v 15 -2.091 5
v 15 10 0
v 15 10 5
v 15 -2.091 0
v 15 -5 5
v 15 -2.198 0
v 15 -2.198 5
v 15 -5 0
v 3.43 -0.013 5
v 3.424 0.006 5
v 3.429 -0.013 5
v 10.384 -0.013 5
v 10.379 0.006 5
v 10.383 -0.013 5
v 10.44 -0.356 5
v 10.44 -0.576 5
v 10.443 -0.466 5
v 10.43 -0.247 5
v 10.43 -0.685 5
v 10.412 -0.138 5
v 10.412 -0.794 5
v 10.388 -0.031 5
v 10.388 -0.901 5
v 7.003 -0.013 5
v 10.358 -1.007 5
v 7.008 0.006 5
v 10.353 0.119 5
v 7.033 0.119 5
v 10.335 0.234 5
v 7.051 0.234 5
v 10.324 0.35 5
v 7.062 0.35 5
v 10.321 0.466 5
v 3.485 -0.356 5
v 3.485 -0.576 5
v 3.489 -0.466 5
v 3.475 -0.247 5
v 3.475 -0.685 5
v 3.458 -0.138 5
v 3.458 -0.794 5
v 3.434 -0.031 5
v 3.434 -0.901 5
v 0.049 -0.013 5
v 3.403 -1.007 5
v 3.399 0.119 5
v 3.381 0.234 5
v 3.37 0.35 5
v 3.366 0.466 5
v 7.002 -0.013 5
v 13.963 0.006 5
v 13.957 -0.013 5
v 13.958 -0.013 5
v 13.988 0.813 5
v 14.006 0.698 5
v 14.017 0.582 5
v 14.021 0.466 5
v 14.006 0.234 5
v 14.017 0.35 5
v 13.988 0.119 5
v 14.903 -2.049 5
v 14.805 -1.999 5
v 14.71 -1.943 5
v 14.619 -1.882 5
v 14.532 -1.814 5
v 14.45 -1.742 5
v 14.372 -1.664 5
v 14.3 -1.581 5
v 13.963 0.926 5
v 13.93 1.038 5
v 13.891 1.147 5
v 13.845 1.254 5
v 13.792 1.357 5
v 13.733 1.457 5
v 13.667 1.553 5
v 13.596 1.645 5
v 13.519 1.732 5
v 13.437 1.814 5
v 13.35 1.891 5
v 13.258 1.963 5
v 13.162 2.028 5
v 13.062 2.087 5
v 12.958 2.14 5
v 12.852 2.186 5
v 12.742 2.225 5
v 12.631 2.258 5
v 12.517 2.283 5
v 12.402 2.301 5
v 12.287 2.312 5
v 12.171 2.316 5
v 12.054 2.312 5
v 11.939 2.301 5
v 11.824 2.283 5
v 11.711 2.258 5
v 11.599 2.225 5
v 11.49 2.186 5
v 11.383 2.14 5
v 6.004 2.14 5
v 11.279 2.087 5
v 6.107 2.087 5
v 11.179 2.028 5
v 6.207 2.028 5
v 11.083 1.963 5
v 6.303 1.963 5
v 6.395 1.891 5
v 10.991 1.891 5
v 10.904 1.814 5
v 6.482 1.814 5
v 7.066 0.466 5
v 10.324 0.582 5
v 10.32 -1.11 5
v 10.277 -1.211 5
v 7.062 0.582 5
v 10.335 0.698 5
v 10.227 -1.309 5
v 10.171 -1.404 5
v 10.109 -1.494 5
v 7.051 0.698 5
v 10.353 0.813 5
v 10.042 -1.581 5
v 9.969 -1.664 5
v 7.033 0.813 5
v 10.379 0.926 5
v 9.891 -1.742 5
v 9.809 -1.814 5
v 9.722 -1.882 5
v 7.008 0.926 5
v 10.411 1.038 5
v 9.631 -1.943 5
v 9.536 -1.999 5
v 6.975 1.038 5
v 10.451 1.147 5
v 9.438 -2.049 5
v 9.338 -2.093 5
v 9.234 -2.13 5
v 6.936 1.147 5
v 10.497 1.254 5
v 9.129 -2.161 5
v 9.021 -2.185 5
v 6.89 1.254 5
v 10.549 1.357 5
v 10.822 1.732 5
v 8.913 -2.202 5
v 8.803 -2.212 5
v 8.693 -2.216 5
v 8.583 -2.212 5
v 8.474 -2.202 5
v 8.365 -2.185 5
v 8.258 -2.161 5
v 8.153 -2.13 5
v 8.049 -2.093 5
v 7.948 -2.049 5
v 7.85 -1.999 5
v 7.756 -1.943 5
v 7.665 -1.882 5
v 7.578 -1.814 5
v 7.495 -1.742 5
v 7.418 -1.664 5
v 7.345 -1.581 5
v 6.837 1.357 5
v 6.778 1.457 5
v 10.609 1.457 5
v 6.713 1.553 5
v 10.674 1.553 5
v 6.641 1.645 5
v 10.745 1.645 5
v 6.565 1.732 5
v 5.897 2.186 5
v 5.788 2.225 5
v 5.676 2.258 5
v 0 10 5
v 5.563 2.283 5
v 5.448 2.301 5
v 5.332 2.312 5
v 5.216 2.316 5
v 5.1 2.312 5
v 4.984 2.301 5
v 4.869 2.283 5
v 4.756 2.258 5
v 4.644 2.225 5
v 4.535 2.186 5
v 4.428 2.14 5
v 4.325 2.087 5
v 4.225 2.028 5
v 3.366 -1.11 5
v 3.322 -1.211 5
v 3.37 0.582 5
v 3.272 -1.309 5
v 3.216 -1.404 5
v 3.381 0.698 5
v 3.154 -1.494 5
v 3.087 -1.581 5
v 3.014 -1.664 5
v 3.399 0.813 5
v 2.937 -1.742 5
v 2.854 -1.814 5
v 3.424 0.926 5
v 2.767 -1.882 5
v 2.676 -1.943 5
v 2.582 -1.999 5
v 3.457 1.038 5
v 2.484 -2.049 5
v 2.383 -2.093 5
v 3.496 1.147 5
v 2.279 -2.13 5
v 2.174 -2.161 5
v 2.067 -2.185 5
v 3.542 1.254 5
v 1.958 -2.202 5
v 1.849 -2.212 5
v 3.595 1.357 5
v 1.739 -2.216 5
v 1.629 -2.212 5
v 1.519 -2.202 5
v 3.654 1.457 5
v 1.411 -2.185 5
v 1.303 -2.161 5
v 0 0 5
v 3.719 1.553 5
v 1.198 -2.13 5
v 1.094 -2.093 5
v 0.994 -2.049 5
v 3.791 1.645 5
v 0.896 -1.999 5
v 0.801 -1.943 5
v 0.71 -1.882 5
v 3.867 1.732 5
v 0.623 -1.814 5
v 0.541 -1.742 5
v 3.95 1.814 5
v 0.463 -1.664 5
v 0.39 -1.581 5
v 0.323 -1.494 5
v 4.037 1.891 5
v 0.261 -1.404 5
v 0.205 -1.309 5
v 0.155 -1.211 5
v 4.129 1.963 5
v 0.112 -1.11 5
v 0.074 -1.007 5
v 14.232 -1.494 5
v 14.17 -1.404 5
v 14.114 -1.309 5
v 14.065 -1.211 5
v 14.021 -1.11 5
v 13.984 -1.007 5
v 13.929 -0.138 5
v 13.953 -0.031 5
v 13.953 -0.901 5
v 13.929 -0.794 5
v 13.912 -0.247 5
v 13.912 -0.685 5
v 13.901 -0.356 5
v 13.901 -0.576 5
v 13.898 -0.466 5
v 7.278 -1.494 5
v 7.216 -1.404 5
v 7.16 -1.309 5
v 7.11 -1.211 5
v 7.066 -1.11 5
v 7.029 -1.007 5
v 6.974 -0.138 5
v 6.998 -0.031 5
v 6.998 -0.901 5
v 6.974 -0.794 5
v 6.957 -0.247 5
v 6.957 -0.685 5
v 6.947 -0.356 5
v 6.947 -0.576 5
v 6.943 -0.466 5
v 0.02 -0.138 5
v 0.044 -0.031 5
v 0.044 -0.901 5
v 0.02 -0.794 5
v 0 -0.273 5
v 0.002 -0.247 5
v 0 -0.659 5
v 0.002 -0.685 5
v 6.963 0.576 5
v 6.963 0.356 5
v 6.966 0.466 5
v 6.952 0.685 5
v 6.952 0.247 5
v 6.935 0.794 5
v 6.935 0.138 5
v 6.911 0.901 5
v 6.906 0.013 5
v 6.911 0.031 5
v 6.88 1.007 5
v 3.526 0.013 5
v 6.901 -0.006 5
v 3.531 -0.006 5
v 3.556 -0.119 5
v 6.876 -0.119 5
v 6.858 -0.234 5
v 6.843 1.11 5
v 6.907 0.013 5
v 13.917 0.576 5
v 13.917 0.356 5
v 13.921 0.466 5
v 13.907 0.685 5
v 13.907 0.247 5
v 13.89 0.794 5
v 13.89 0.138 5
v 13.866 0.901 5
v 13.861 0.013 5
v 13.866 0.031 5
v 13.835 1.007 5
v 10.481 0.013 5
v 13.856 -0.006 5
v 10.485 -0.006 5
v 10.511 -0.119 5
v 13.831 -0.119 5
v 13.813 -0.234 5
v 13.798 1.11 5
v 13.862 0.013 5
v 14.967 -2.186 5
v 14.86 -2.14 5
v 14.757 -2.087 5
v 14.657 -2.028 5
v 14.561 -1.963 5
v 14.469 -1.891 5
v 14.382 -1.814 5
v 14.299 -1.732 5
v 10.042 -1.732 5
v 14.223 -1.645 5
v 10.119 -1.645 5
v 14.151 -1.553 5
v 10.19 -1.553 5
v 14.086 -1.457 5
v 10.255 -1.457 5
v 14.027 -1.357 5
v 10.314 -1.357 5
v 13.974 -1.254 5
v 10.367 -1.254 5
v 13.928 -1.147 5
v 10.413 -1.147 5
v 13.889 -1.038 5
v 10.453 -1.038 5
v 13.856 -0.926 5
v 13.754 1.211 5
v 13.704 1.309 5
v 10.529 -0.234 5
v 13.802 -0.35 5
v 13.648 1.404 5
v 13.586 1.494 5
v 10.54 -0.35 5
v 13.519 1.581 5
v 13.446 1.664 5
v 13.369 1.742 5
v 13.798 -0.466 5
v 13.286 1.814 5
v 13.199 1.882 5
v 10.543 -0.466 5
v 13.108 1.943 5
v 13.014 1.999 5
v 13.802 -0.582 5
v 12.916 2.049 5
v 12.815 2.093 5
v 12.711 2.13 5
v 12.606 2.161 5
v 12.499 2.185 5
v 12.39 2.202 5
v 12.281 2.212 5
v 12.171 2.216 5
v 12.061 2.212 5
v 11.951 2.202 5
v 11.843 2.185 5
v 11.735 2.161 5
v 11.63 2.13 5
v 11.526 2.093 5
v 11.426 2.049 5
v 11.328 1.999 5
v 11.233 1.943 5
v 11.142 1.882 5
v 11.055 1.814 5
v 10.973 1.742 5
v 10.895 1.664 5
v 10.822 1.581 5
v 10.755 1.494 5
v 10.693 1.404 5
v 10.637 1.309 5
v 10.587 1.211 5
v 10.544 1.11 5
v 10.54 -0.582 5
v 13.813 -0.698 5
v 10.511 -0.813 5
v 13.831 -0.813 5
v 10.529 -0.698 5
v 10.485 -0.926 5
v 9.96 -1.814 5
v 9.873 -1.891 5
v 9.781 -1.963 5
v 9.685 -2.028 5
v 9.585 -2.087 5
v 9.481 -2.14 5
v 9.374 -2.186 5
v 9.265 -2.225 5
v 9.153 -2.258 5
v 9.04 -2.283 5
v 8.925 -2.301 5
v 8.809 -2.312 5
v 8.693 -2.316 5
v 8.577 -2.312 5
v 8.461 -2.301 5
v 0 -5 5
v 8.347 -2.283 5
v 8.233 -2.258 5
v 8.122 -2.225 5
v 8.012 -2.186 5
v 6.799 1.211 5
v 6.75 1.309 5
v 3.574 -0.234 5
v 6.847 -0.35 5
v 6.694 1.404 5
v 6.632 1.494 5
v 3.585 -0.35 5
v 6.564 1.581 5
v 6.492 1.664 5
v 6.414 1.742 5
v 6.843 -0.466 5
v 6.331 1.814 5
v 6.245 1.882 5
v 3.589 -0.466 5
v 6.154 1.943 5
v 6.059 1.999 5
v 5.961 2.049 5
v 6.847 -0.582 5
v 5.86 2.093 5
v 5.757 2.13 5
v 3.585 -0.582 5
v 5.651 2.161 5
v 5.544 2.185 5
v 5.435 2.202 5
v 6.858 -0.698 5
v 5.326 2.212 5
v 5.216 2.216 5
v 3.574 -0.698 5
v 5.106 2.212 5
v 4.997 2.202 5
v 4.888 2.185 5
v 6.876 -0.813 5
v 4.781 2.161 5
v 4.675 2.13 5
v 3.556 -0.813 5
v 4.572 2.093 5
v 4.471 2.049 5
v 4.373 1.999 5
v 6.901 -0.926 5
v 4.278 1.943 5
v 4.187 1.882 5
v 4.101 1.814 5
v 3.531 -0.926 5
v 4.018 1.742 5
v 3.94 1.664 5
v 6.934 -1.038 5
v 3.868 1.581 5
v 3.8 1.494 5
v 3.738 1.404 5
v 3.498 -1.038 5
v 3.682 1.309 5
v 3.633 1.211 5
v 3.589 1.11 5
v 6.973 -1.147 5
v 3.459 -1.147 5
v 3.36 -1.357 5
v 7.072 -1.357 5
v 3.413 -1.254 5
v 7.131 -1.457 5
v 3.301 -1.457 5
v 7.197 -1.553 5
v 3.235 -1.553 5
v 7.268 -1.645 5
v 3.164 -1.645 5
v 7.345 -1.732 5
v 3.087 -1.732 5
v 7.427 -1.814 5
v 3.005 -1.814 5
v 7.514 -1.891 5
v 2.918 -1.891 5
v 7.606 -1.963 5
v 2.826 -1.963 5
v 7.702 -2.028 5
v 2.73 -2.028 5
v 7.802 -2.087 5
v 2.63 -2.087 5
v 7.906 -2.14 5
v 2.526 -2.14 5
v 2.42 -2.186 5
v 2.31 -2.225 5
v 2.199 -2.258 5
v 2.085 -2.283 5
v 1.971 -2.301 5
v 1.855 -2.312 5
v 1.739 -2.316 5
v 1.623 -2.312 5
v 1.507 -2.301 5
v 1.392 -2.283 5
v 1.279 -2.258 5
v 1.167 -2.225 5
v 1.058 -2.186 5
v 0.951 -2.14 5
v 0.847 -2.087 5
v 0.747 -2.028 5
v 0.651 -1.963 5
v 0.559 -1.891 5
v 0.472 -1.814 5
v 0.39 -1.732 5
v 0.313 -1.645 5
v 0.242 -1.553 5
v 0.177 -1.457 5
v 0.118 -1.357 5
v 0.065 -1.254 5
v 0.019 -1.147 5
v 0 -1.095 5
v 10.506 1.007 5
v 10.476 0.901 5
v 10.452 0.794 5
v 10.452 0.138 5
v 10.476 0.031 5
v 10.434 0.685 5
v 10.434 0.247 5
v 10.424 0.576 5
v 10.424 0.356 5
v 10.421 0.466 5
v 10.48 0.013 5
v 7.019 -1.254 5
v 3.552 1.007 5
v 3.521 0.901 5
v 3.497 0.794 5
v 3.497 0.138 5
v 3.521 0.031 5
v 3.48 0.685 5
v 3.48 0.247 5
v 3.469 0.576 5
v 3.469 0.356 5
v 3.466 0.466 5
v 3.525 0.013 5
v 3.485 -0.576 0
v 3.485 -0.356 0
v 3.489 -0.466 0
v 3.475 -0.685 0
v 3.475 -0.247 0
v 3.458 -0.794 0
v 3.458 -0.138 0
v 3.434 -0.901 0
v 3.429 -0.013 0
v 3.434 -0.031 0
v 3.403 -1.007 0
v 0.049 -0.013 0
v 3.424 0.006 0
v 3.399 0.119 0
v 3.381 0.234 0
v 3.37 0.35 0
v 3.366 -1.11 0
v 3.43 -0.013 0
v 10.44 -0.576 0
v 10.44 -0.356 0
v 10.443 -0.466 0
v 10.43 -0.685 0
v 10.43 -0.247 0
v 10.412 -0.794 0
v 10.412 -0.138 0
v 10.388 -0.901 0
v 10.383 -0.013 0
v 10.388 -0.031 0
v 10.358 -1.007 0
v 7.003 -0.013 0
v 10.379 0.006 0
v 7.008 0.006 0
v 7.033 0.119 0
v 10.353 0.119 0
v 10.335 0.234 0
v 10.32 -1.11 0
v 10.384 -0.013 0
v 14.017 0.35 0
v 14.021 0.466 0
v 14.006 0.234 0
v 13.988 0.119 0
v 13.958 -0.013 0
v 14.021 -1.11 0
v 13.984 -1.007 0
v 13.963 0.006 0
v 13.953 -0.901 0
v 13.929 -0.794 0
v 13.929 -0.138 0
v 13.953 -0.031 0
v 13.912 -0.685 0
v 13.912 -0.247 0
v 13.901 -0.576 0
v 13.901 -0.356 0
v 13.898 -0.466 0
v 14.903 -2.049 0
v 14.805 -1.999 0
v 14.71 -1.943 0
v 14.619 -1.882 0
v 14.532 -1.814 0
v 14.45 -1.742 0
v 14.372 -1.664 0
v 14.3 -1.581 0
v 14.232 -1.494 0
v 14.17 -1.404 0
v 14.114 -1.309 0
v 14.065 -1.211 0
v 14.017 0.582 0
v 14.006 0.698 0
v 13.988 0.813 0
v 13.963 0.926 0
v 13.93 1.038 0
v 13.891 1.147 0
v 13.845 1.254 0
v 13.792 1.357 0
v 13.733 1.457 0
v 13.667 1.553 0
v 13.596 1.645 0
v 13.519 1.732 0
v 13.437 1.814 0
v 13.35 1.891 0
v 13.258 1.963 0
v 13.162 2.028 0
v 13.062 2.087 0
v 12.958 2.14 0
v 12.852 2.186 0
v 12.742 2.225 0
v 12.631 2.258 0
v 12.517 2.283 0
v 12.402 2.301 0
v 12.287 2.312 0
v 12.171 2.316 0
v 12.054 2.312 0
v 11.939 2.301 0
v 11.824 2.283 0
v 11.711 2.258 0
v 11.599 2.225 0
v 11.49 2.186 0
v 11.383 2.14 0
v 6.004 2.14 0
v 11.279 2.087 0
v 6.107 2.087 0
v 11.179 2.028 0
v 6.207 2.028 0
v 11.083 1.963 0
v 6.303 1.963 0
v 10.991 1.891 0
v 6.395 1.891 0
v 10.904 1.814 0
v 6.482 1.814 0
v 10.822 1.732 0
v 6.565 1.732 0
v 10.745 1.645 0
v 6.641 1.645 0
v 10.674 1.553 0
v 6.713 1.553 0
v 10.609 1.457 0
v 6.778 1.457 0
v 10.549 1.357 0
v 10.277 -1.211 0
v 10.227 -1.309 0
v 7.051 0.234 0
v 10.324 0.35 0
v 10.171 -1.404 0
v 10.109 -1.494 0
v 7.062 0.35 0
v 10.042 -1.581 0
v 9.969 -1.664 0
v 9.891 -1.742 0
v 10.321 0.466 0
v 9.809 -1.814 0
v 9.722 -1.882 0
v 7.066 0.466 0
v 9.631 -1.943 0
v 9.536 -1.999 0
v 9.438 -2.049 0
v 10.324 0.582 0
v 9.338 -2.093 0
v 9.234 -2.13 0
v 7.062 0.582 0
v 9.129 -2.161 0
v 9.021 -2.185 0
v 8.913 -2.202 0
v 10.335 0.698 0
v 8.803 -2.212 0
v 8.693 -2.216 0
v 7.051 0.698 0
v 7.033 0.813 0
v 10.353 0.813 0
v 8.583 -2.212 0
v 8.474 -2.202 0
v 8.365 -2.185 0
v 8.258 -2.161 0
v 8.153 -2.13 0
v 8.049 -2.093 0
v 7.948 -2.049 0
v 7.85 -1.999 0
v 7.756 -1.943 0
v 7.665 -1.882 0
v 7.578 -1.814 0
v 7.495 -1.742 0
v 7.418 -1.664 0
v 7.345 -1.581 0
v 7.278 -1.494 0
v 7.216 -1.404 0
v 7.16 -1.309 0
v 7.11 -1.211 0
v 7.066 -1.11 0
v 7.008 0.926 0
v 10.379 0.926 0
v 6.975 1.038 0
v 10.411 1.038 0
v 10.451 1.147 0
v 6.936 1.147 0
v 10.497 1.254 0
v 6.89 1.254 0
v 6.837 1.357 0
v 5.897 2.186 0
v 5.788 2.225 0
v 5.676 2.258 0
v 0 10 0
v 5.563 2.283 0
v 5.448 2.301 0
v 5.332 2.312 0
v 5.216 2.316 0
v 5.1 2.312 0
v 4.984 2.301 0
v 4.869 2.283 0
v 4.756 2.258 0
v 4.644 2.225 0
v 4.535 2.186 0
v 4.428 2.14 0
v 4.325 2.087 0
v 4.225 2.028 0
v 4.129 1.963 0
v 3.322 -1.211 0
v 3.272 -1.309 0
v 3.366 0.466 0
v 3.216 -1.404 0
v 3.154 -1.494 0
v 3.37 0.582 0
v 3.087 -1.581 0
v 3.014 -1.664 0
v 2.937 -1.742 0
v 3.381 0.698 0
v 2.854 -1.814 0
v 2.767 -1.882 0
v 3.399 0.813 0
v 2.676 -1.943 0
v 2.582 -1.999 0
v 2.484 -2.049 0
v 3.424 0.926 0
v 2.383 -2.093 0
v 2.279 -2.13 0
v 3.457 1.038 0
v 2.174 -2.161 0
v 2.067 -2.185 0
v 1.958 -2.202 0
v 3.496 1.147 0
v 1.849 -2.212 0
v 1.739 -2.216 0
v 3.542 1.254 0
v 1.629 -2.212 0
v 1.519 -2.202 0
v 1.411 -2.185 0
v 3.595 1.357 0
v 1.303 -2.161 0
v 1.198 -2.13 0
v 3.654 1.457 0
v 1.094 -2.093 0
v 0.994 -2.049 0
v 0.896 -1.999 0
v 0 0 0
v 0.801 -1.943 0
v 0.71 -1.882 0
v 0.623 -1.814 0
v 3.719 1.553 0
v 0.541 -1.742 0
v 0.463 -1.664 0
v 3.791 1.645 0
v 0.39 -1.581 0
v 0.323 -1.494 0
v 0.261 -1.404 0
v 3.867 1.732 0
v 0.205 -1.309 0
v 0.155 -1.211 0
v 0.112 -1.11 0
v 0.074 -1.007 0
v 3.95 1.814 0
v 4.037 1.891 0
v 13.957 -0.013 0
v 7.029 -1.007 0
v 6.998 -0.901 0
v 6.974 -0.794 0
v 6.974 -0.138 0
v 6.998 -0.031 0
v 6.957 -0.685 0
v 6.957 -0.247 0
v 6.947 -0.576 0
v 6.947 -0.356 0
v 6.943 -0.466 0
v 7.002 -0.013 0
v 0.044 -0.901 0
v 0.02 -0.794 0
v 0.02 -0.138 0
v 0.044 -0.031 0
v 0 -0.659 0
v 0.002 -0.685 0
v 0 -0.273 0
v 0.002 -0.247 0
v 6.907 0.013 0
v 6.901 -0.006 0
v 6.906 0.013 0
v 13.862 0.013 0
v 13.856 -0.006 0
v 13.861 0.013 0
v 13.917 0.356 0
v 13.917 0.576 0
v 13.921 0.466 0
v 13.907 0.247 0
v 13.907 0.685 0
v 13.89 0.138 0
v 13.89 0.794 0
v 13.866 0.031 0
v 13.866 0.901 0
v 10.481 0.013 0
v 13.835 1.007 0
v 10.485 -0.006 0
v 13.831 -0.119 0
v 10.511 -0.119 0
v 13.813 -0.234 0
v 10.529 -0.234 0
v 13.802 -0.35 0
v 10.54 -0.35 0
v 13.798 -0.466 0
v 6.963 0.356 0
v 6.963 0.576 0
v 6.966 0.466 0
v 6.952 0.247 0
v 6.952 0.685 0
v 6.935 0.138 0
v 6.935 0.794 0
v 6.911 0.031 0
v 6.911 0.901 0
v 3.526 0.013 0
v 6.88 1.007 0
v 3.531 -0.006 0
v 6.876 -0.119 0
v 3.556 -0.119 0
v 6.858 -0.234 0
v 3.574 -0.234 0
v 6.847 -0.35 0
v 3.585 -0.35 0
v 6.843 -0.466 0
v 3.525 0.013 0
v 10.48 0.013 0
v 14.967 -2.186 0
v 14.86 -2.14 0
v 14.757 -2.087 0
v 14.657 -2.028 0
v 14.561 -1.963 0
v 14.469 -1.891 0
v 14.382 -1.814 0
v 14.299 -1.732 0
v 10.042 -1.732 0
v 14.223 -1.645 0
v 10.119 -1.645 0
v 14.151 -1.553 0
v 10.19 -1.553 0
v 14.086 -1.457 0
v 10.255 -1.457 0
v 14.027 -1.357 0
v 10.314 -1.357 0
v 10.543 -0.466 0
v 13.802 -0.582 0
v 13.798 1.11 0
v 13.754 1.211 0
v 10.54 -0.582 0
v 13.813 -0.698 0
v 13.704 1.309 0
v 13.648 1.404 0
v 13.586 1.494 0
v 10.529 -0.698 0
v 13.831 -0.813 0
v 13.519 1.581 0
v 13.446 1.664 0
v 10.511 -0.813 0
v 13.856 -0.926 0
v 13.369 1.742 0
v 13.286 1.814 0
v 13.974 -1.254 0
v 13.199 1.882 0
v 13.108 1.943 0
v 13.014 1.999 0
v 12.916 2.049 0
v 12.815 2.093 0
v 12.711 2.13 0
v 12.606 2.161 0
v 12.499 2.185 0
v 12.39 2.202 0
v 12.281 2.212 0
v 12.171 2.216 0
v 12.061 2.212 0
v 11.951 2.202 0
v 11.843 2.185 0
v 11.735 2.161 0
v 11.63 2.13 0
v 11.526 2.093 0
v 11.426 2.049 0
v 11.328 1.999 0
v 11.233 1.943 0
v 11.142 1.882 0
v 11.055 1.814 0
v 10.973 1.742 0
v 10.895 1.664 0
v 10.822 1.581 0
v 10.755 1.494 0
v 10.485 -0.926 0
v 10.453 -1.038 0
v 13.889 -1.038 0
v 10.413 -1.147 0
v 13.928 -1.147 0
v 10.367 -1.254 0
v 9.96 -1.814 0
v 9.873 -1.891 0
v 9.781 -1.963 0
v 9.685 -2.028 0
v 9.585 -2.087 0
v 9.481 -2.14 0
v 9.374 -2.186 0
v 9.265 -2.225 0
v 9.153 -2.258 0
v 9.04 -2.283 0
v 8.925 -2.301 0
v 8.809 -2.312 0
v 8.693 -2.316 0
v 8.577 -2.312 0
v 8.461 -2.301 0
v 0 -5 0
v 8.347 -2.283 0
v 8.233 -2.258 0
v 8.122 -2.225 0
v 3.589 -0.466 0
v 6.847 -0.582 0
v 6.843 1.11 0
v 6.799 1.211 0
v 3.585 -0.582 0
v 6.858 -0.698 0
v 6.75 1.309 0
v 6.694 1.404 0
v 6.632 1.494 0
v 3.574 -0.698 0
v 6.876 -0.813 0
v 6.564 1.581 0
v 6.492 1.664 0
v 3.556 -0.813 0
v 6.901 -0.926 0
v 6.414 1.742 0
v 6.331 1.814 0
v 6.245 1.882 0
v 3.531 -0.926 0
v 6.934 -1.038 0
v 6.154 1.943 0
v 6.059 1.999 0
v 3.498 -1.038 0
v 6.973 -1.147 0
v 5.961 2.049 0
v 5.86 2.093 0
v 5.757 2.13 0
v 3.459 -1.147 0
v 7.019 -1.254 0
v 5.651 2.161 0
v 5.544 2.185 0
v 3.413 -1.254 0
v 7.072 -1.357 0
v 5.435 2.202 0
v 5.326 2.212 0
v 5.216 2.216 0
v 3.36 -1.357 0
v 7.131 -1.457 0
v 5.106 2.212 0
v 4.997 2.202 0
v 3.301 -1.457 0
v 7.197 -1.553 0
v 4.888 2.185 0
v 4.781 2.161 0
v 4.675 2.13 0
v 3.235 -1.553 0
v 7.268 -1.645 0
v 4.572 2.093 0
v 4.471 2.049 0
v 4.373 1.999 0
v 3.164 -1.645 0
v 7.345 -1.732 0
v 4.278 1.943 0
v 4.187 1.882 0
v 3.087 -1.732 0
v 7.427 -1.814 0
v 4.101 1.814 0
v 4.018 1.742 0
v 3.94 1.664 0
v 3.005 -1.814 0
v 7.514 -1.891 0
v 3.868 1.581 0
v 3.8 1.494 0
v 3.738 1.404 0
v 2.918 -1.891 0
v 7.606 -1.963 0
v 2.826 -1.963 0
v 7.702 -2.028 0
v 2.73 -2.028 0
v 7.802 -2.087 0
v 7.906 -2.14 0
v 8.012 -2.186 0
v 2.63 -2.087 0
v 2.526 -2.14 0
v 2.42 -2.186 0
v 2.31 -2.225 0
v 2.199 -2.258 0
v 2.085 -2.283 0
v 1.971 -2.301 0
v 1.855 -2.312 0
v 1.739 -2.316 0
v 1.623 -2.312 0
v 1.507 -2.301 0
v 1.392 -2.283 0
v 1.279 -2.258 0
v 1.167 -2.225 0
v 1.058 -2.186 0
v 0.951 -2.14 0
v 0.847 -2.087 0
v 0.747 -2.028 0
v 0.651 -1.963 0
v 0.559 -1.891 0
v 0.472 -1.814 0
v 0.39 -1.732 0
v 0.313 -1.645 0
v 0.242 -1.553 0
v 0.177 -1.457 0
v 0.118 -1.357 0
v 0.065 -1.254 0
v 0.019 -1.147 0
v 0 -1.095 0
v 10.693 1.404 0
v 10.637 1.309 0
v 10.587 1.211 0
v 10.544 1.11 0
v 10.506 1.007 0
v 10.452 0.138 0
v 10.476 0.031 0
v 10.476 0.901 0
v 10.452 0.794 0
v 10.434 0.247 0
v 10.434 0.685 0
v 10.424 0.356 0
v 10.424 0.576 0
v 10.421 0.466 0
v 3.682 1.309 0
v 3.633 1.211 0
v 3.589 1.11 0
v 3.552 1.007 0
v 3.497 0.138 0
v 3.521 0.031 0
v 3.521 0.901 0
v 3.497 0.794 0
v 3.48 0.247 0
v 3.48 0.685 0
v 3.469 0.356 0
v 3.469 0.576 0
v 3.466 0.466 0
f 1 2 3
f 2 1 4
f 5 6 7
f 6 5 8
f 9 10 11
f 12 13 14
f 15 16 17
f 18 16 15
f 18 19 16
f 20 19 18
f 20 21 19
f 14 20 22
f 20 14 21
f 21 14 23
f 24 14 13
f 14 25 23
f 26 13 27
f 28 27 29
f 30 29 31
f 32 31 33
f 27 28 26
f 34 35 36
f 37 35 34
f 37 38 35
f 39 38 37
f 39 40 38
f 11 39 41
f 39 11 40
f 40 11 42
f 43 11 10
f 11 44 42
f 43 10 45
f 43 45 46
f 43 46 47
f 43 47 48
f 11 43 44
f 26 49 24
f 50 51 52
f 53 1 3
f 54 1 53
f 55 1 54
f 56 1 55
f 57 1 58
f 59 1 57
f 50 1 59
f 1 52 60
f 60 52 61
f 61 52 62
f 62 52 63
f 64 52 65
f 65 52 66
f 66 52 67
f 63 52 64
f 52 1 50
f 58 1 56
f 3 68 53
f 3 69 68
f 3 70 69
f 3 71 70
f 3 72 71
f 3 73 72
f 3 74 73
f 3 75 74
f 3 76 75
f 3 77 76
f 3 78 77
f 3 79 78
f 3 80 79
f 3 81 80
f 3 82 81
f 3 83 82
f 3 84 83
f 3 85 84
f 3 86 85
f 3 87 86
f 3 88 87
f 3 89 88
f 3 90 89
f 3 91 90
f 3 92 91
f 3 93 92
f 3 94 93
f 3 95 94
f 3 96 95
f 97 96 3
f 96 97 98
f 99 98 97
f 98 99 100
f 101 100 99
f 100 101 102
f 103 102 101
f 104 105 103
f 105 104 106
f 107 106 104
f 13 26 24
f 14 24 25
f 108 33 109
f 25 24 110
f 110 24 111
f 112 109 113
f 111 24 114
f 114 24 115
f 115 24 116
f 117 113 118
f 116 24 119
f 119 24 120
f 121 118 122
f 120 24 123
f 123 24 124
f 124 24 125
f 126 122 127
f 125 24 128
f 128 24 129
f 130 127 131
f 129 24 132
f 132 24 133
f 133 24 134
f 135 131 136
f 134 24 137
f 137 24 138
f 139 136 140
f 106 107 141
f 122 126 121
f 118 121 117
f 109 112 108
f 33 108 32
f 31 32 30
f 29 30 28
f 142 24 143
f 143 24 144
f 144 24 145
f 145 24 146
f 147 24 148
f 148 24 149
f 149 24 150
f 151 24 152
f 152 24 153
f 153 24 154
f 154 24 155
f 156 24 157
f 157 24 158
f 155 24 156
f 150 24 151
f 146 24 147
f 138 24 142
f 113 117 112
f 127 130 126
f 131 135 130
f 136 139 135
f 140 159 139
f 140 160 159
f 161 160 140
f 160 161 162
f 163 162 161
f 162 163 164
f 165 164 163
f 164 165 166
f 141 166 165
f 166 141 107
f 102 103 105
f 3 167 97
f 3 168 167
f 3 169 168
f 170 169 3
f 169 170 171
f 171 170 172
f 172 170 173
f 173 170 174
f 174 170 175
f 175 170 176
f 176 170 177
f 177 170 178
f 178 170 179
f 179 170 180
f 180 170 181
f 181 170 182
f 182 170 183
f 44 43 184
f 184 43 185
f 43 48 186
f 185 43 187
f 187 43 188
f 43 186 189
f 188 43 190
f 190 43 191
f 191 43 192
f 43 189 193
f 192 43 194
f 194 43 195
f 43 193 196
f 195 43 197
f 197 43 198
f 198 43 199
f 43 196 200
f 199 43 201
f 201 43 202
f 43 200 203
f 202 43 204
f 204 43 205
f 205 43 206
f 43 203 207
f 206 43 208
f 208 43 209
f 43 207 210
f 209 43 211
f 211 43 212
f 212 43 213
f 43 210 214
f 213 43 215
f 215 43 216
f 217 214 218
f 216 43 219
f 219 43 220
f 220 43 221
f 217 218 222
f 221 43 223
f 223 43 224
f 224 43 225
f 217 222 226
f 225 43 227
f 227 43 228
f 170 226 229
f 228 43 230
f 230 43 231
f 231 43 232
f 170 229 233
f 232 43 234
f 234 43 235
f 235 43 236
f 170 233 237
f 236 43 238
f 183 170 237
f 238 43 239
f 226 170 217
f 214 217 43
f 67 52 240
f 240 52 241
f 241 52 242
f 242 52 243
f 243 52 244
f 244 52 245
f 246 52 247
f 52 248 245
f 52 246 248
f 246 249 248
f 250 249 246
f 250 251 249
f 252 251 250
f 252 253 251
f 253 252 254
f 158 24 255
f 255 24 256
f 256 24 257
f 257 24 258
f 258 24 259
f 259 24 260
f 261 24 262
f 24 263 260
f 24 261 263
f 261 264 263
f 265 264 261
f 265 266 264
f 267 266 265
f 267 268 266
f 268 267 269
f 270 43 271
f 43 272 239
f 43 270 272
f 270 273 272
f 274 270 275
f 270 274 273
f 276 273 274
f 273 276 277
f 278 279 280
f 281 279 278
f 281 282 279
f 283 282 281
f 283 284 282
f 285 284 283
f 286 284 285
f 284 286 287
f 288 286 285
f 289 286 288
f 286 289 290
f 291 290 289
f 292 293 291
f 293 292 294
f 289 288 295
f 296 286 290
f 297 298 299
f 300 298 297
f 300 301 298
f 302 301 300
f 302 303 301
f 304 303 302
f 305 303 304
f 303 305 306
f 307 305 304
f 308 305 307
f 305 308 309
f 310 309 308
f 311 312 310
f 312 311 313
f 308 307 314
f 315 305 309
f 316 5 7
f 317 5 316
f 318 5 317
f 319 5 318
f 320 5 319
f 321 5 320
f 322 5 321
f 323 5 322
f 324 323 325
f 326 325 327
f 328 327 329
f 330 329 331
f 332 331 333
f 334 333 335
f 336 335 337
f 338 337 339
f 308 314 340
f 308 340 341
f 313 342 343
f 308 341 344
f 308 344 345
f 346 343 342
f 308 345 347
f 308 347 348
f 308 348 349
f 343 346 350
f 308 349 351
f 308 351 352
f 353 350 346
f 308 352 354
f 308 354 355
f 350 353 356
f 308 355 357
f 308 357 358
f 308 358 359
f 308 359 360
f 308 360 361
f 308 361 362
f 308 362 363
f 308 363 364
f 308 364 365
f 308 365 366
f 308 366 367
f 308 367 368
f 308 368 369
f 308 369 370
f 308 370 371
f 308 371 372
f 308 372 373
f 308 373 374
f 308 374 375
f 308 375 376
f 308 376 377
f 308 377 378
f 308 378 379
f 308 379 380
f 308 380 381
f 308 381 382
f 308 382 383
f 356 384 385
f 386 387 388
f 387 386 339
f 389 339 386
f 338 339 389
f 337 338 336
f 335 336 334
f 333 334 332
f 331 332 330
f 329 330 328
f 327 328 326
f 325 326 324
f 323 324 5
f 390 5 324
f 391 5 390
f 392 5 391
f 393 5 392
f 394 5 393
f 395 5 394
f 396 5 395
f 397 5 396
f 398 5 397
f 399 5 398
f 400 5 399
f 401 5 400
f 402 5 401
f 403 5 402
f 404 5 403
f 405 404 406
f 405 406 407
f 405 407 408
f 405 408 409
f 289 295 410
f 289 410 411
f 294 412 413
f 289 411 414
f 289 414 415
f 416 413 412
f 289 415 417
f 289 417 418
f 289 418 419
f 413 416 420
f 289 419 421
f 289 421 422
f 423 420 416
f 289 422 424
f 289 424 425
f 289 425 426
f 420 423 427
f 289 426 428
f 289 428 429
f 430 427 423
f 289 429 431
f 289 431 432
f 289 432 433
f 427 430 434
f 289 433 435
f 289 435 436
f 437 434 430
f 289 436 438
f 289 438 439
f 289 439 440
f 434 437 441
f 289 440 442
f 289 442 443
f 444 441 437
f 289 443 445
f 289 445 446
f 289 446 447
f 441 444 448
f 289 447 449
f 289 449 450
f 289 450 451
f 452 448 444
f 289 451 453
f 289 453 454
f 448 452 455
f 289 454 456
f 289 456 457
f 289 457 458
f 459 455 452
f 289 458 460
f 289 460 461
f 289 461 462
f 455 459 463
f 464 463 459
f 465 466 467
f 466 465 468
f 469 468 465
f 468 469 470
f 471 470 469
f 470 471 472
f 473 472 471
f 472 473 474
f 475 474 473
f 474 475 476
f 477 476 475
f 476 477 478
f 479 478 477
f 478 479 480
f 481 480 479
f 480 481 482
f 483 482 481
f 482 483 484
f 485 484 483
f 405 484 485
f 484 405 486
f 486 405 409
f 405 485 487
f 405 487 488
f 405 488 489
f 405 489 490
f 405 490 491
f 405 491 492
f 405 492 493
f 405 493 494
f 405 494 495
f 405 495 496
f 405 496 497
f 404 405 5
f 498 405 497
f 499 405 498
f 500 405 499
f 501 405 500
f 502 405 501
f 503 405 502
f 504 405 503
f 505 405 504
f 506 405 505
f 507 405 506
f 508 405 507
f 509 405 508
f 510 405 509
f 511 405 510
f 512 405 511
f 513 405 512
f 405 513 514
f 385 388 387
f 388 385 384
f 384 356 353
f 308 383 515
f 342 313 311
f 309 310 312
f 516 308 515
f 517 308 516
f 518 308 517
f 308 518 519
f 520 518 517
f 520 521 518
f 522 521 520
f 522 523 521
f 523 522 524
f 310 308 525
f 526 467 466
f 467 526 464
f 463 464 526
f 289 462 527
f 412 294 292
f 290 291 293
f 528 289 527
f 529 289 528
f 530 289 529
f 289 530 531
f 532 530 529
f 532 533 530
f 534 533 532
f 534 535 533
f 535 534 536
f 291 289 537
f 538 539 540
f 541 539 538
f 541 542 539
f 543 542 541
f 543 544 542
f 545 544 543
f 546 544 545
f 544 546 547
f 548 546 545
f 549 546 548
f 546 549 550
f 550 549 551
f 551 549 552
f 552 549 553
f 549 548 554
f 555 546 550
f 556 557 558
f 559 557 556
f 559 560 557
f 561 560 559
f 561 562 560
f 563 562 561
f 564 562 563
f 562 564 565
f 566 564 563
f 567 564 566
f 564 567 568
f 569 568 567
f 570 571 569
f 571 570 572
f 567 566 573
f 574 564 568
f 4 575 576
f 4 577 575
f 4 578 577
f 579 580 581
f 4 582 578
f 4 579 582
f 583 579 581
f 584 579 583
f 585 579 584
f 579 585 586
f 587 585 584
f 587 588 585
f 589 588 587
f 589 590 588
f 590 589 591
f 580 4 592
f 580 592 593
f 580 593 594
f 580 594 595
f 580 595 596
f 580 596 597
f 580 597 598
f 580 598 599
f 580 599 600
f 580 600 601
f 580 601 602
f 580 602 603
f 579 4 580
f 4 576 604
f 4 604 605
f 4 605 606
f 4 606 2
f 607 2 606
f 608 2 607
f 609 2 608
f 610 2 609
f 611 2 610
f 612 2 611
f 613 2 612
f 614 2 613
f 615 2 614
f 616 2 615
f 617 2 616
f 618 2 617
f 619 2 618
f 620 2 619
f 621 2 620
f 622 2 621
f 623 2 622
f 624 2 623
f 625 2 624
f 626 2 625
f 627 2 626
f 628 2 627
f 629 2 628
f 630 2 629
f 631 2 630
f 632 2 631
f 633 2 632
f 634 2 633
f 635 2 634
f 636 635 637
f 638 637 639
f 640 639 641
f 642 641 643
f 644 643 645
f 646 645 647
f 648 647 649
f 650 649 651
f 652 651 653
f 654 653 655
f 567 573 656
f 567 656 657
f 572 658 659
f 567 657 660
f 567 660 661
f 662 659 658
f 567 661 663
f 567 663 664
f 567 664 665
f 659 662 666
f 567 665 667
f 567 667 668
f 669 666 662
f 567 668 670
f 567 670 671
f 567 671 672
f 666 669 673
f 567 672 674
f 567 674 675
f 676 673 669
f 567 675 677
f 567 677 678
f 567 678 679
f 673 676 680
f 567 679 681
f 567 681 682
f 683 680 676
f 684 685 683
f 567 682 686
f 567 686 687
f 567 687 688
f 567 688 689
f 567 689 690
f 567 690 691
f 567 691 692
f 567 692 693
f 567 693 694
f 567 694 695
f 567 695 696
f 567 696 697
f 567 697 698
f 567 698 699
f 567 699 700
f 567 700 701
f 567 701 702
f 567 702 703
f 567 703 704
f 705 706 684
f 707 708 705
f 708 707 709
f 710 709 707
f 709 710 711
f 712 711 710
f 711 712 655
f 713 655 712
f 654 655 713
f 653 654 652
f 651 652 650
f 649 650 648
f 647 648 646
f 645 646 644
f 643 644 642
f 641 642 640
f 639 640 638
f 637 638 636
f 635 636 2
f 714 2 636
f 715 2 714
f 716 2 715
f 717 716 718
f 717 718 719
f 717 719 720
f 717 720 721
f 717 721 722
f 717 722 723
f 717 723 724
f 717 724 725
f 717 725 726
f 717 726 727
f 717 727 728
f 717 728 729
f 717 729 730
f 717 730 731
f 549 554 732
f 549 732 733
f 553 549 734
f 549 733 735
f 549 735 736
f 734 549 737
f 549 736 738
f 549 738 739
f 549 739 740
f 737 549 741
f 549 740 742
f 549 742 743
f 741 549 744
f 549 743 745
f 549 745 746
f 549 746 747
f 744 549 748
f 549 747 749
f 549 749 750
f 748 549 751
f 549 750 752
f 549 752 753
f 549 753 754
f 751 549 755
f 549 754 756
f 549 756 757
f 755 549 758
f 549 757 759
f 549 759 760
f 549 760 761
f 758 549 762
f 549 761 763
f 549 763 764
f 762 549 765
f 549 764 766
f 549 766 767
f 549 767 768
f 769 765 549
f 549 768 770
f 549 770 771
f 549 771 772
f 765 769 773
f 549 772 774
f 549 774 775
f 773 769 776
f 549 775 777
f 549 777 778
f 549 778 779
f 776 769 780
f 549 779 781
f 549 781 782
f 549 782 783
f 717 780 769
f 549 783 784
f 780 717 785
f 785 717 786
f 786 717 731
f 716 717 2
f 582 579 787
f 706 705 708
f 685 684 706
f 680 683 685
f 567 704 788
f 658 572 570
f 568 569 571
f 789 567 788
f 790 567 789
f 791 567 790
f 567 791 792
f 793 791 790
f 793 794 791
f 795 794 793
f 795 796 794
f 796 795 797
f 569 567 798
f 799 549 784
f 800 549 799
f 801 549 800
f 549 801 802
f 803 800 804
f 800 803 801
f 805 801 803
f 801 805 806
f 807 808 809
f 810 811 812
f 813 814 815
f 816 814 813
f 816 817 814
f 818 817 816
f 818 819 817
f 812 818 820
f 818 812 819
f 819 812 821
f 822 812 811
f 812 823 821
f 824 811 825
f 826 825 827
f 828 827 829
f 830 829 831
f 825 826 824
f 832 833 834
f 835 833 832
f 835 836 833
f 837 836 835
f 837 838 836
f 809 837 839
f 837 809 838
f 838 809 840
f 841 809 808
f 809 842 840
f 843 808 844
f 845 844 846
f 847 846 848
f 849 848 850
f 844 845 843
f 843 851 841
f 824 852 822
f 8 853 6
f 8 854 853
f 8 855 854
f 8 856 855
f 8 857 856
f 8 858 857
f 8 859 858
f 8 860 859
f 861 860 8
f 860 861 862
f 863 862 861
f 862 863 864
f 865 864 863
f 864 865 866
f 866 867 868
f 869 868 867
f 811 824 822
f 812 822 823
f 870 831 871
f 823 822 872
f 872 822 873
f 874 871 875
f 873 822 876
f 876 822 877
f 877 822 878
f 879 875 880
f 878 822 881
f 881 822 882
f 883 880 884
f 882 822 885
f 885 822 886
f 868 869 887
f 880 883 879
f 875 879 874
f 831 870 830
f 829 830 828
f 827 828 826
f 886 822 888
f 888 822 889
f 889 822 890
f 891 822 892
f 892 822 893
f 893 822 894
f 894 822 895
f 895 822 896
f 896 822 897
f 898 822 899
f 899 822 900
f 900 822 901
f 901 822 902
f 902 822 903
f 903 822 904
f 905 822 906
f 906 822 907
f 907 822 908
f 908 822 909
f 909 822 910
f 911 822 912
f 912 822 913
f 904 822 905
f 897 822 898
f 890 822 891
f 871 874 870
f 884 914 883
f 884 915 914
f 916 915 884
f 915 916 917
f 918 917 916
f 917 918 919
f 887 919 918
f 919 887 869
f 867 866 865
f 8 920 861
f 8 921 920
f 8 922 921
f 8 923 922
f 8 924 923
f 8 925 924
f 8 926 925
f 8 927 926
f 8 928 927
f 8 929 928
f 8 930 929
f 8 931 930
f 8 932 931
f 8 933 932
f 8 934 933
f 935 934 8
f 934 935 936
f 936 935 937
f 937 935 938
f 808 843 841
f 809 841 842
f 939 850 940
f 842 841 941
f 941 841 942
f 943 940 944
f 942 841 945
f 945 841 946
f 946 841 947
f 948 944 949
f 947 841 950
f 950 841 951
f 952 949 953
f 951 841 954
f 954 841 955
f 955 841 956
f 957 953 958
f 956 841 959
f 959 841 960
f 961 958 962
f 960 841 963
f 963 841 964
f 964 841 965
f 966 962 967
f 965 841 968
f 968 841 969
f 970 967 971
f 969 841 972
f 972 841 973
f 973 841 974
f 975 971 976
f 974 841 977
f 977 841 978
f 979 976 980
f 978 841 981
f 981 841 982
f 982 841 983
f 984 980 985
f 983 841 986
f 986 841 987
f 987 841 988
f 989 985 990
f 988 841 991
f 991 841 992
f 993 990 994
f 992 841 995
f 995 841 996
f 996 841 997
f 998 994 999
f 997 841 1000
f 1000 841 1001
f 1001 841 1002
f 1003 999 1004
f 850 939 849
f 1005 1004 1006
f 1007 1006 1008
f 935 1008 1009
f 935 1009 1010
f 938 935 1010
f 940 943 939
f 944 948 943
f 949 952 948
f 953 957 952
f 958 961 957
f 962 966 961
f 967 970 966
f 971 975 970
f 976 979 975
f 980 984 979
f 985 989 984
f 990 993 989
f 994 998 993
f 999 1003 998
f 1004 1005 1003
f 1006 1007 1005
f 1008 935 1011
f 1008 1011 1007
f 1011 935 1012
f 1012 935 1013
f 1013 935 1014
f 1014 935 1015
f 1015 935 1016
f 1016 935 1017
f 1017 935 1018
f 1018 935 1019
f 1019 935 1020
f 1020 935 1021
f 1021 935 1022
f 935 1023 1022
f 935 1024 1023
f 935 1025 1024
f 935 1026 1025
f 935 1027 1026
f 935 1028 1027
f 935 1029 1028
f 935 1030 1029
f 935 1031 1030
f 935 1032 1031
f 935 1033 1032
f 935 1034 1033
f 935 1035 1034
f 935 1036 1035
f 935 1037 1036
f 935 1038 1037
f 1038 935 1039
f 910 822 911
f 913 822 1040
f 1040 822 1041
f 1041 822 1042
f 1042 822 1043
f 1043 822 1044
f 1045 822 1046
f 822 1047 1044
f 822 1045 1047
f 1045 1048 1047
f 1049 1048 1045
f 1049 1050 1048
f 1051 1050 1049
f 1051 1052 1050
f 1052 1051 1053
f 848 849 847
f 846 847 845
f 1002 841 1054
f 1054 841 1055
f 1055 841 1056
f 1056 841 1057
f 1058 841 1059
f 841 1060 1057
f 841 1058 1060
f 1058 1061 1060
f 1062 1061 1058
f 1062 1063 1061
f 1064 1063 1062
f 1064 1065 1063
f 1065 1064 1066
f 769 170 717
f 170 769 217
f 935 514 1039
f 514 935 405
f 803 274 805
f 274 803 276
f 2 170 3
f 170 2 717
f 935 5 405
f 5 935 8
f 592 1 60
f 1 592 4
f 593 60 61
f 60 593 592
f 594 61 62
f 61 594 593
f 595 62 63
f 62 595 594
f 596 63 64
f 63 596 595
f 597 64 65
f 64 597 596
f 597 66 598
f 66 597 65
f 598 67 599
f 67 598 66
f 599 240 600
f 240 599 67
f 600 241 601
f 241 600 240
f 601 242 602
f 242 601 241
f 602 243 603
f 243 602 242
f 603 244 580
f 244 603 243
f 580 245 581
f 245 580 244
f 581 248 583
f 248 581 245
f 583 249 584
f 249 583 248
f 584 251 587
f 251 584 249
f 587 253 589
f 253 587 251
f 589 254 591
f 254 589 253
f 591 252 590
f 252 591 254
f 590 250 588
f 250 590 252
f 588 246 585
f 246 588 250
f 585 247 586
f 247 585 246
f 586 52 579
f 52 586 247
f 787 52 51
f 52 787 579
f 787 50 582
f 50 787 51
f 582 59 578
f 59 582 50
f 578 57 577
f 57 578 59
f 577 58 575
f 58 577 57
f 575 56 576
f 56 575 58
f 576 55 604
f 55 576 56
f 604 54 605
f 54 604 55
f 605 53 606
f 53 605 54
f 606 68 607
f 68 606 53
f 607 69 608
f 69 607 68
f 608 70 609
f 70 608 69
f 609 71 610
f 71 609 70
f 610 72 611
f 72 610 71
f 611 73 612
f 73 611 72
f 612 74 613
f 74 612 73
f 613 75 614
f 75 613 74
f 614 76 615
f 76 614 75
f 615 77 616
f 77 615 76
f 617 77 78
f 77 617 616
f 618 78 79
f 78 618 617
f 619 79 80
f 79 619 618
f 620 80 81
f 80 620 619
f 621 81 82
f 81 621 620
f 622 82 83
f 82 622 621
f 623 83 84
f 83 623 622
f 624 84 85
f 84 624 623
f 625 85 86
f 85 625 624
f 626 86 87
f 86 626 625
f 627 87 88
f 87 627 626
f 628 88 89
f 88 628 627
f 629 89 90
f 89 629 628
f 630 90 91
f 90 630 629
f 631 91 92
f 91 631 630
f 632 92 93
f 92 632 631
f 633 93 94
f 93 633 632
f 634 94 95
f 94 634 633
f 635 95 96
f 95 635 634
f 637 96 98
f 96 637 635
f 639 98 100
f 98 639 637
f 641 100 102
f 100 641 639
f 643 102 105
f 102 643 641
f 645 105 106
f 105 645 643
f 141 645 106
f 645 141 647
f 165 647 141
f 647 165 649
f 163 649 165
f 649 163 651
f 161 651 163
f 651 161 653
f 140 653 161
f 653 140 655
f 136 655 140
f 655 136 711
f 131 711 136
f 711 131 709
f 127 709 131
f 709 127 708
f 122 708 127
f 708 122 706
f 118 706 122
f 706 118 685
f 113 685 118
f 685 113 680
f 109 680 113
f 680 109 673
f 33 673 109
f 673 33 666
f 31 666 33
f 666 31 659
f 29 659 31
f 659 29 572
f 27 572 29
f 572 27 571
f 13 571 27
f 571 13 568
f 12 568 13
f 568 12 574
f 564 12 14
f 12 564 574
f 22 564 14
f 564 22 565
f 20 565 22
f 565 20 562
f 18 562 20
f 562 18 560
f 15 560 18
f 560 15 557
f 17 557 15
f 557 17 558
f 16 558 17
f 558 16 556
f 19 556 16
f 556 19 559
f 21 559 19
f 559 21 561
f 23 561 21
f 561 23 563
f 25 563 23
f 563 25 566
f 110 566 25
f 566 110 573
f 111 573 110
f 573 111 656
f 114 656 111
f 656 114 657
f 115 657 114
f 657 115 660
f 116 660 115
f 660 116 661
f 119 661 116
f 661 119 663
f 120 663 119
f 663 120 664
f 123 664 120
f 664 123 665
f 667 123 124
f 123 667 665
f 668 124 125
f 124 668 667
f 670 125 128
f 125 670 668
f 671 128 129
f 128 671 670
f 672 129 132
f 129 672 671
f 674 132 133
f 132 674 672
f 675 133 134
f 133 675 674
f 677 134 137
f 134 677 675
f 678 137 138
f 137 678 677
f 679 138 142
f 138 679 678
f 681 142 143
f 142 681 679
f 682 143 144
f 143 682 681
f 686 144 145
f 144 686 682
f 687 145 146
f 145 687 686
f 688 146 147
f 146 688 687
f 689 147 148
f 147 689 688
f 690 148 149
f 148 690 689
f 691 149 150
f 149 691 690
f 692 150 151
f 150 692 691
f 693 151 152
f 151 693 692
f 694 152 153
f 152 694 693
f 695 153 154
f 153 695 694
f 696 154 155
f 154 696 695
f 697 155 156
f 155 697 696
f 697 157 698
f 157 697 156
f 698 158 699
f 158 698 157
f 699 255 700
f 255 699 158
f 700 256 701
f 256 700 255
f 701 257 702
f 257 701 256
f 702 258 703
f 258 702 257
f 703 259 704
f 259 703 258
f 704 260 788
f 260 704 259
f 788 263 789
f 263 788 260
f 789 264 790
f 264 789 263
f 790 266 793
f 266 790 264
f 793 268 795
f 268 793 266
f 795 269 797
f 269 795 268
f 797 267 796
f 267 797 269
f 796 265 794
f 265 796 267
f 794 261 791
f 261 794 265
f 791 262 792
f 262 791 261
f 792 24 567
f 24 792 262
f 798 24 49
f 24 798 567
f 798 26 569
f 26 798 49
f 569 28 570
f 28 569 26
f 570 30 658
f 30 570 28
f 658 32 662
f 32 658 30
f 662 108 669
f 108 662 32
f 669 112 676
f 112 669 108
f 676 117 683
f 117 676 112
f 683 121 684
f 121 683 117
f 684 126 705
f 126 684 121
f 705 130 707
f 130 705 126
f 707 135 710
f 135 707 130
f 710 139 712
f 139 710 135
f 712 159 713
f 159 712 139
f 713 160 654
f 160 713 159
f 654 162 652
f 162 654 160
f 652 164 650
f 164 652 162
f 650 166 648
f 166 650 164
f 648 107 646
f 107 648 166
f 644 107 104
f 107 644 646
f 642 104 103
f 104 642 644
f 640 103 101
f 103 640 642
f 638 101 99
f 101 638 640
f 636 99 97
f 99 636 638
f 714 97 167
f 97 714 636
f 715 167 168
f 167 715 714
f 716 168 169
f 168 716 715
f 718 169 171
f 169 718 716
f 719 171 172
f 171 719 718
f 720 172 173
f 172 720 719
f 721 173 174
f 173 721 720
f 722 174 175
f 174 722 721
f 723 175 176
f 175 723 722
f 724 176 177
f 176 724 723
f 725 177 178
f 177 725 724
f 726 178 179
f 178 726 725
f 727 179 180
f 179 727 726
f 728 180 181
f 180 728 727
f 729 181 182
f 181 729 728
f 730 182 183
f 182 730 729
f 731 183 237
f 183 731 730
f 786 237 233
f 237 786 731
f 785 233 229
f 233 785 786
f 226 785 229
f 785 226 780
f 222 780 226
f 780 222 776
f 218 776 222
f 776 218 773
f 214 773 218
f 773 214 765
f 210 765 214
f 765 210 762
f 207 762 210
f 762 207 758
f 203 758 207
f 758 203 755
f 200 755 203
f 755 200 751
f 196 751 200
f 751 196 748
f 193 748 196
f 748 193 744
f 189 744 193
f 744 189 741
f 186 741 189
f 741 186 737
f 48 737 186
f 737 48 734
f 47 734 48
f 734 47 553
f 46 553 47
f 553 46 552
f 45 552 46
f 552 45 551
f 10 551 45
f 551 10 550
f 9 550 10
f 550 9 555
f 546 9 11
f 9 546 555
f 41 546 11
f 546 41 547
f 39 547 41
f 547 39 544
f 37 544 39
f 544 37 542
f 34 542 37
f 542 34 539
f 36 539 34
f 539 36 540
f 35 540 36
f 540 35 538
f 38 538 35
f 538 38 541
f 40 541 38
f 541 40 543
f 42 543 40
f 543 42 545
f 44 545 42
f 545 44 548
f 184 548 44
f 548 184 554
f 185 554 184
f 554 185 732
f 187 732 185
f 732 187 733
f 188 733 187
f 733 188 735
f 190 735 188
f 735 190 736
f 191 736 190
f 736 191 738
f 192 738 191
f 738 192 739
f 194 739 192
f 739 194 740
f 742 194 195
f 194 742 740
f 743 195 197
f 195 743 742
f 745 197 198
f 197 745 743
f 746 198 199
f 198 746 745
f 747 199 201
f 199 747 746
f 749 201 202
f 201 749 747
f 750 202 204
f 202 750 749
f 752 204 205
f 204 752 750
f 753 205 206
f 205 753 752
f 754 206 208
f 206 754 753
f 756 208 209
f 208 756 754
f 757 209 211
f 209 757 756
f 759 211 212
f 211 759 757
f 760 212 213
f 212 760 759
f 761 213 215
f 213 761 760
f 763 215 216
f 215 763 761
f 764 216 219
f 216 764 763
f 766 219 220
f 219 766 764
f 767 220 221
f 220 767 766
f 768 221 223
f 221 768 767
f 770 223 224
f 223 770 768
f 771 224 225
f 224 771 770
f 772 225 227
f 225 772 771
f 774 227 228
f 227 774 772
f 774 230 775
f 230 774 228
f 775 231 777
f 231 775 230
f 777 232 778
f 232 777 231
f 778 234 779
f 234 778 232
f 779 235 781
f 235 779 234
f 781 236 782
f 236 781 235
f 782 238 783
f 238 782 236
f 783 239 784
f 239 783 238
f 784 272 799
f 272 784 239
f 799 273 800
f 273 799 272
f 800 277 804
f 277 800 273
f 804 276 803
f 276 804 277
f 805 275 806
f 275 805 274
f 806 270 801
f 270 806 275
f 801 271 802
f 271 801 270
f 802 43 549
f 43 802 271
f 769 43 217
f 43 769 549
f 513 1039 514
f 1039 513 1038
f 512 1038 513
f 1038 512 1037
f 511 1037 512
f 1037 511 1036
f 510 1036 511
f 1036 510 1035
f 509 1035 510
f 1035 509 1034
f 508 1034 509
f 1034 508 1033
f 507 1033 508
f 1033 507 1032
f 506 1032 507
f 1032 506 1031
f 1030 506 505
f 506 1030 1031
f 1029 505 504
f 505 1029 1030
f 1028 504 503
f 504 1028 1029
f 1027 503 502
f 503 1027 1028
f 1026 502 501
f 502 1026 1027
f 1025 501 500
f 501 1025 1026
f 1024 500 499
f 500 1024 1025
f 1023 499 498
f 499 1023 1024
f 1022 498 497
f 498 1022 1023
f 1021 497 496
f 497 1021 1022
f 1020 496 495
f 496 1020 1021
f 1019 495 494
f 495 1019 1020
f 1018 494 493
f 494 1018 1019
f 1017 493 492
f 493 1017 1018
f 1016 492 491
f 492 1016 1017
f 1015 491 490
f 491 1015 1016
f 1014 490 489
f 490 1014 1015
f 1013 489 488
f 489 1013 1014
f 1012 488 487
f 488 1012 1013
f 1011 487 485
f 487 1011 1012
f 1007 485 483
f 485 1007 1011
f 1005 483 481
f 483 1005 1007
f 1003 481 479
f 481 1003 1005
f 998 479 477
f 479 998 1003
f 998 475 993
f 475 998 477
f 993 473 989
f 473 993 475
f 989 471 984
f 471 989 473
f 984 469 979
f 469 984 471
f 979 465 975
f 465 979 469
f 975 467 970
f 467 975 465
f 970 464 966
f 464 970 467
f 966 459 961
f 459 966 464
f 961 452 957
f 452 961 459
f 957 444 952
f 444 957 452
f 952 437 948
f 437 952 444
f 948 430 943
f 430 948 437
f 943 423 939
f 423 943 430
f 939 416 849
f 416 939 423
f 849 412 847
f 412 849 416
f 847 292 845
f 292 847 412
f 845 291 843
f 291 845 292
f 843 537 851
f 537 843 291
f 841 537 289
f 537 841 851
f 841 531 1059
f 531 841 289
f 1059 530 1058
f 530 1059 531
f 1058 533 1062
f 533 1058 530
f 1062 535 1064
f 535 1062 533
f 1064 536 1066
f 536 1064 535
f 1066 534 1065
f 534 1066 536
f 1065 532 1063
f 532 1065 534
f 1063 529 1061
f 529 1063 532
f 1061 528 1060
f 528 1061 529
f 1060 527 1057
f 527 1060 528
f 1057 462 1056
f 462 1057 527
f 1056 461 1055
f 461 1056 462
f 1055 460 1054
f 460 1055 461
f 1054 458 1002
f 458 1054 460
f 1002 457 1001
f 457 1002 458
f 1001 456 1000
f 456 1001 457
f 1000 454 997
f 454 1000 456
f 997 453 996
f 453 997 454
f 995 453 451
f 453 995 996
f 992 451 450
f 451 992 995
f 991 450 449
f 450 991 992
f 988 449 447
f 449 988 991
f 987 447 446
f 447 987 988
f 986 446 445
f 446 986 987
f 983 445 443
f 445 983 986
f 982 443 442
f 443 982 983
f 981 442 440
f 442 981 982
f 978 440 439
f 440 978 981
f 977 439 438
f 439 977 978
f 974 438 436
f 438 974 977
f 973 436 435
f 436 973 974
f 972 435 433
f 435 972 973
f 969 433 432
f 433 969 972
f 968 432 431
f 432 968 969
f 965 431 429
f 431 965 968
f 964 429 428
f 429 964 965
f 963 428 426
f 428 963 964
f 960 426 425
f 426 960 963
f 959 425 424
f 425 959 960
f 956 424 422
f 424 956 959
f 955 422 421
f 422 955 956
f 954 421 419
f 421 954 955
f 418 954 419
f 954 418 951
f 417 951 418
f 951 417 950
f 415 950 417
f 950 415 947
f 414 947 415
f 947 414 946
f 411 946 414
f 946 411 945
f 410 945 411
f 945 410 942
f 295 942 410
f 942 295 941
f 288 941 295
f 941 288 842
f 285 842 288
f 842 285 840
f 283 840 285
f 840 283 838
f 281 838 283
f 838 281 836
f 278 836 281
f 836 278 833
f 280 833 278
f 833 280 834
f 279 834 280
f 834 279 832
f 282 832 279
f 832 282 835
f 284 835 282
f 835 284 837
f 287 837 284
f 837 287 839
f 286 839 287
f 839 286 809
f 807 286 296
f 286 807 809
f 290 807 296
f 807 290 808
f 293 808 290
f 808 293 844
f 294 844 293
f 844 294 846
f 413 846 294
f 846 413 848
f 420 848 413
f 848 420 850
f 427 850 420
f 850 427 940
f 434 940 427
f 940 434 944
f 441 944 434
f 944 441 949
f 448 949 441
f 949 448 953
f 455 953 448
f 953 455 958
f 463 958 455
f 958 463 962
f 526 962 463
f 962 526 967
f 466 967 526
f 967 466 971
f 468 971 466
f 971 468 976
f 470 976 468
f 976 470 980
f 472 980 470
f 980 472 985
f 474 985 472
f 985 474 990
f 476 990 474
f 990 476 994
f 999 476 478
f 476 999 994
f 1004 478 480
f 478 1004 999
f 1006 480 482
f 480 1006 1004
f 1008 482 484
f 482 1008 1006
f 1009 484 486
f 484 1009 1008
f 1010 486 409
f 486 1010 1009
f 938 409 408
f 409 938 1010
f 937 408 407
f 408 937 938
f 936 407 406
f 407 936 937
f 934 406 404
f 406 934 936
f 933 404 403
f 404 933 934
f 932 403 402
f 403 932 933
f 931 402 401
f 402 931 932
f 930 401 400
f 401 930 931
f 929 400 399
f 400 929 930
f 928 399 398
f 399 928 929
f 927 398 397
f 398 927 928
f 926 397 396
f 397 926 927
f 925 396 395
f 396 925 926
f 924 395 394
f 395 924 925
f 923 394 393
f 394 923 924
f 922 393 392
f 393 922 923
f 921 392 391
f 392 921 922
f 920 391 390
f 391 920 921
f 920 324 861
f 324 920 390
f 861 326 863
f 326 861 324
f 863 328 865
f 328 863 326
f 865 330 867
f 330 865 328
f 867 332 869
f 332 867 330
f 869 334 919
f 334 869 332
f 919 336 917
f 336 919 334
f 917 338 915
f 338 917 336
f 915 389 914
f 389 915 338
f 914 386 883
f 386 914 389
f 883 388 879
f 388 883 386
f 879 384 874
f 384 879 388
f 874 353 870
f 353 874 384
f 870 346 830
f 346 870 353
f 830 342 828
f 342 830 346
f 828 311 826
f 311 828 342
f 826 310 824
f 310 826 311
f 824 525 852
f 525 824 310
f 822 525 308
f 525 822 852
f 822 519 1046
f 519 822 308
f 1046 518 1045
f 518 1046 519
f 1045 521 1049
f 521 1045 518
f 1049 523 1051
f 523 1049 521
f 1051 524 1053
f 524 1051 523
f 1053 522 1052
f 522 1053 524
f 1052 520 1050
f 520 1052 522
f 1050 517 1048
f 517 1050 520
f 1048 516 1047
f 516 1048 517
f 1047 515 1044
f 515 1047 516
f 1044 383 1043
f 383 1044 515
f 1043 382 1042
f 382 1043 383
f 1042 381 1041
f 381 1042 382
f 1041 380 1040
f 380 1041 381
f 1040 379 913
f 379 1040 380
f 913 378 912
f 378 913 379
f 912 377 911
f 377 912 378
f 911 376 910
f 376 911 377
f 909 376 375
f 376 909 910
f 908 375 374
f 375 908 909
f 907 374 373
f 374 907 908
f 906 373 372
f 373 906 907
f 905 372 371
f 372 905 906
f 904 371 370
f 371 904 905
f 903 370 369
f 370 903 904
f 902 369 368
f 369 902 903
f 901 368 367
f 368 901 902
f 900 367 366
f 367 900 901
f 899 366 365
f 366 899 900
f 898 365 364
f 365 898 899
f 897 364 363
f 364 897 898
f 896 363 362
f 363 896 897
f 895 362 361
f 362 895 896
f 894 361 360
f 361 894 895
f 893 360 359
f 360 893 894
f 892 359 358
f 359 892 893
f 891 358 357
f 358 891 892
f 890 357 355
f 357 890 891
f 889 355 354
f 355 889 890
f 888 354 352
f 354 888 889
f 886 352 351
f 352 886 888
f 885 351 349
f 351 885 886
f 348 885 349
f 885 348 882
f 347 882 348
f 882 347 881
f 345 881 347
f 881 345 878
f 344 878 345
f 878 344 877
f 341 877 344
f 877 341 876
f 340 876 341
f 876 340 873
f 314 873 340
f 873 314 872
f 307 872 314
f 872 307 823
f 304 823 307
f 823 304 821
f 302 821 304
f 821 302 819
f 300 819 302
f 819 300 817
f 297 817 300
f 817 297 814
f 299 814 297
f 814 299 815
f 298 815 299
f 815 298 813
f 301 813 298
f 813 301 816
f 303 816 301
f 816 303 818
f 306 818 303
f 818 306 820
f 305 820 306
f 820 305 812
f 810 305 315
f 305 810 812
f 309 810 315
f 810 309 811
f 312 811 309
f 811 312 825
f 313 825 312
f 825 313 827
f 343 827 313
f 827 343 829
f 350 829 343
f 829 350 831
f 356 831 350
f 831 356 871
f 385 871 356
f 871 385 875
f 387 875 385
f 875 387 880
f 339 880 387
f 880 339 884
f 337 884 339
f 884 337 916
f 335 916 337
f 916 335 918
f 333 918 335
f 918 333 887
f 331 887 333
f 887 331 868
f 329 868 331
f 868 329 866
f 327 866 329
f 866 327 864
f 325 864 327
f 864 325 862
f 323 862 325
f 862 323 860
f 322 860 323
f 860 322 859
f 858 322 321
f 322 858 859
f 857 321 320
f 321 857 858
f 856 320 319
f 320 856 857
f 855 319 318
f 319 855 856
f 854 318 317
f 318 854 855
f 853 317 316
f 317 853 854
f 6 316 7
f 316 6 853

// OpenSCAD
$fn=100;

difference(){
    translate([0,-5,0])
    cube([15,15,5]);
linear_extrude(7)
cut_line(15, radius=1.8, width=0.1, arc_angle = 210);
}

module cut_line(lenght, width = 1, radius = 10, arc_angle = 120) {
    if(lenght>0) {
        translate([
        sin(arc_angle/2)*radius,
        cos(arc_angle/2)*radius,
        0])
        arc(arc_angle, radius, width);
     
        translate([sin(arc_angle/2)*radius*2,0,0])
        mirror([0,1,0])
        cut_line(lenght-sin(arc_angle/2)*radius*2, width, radius, arc_angle);
    }    
}

module arc(angle, radius, width) {
    arc180(angle/2, radius, width);
    mirror([1,0,0]) arc180(angle/2, radius, width);
}

module arc180(angle, radius, width) {
    difference(){
        circle(radius+width/2);
        circle(radius-width/2);
        
        translate([radius*1.5,0,0])
        square(radius*3,center = true);
        
        rotate([0,0,180-angle])
        translate([radius*1.5,0,0])
        square(radius*3,center = true);        
        
    }
}
